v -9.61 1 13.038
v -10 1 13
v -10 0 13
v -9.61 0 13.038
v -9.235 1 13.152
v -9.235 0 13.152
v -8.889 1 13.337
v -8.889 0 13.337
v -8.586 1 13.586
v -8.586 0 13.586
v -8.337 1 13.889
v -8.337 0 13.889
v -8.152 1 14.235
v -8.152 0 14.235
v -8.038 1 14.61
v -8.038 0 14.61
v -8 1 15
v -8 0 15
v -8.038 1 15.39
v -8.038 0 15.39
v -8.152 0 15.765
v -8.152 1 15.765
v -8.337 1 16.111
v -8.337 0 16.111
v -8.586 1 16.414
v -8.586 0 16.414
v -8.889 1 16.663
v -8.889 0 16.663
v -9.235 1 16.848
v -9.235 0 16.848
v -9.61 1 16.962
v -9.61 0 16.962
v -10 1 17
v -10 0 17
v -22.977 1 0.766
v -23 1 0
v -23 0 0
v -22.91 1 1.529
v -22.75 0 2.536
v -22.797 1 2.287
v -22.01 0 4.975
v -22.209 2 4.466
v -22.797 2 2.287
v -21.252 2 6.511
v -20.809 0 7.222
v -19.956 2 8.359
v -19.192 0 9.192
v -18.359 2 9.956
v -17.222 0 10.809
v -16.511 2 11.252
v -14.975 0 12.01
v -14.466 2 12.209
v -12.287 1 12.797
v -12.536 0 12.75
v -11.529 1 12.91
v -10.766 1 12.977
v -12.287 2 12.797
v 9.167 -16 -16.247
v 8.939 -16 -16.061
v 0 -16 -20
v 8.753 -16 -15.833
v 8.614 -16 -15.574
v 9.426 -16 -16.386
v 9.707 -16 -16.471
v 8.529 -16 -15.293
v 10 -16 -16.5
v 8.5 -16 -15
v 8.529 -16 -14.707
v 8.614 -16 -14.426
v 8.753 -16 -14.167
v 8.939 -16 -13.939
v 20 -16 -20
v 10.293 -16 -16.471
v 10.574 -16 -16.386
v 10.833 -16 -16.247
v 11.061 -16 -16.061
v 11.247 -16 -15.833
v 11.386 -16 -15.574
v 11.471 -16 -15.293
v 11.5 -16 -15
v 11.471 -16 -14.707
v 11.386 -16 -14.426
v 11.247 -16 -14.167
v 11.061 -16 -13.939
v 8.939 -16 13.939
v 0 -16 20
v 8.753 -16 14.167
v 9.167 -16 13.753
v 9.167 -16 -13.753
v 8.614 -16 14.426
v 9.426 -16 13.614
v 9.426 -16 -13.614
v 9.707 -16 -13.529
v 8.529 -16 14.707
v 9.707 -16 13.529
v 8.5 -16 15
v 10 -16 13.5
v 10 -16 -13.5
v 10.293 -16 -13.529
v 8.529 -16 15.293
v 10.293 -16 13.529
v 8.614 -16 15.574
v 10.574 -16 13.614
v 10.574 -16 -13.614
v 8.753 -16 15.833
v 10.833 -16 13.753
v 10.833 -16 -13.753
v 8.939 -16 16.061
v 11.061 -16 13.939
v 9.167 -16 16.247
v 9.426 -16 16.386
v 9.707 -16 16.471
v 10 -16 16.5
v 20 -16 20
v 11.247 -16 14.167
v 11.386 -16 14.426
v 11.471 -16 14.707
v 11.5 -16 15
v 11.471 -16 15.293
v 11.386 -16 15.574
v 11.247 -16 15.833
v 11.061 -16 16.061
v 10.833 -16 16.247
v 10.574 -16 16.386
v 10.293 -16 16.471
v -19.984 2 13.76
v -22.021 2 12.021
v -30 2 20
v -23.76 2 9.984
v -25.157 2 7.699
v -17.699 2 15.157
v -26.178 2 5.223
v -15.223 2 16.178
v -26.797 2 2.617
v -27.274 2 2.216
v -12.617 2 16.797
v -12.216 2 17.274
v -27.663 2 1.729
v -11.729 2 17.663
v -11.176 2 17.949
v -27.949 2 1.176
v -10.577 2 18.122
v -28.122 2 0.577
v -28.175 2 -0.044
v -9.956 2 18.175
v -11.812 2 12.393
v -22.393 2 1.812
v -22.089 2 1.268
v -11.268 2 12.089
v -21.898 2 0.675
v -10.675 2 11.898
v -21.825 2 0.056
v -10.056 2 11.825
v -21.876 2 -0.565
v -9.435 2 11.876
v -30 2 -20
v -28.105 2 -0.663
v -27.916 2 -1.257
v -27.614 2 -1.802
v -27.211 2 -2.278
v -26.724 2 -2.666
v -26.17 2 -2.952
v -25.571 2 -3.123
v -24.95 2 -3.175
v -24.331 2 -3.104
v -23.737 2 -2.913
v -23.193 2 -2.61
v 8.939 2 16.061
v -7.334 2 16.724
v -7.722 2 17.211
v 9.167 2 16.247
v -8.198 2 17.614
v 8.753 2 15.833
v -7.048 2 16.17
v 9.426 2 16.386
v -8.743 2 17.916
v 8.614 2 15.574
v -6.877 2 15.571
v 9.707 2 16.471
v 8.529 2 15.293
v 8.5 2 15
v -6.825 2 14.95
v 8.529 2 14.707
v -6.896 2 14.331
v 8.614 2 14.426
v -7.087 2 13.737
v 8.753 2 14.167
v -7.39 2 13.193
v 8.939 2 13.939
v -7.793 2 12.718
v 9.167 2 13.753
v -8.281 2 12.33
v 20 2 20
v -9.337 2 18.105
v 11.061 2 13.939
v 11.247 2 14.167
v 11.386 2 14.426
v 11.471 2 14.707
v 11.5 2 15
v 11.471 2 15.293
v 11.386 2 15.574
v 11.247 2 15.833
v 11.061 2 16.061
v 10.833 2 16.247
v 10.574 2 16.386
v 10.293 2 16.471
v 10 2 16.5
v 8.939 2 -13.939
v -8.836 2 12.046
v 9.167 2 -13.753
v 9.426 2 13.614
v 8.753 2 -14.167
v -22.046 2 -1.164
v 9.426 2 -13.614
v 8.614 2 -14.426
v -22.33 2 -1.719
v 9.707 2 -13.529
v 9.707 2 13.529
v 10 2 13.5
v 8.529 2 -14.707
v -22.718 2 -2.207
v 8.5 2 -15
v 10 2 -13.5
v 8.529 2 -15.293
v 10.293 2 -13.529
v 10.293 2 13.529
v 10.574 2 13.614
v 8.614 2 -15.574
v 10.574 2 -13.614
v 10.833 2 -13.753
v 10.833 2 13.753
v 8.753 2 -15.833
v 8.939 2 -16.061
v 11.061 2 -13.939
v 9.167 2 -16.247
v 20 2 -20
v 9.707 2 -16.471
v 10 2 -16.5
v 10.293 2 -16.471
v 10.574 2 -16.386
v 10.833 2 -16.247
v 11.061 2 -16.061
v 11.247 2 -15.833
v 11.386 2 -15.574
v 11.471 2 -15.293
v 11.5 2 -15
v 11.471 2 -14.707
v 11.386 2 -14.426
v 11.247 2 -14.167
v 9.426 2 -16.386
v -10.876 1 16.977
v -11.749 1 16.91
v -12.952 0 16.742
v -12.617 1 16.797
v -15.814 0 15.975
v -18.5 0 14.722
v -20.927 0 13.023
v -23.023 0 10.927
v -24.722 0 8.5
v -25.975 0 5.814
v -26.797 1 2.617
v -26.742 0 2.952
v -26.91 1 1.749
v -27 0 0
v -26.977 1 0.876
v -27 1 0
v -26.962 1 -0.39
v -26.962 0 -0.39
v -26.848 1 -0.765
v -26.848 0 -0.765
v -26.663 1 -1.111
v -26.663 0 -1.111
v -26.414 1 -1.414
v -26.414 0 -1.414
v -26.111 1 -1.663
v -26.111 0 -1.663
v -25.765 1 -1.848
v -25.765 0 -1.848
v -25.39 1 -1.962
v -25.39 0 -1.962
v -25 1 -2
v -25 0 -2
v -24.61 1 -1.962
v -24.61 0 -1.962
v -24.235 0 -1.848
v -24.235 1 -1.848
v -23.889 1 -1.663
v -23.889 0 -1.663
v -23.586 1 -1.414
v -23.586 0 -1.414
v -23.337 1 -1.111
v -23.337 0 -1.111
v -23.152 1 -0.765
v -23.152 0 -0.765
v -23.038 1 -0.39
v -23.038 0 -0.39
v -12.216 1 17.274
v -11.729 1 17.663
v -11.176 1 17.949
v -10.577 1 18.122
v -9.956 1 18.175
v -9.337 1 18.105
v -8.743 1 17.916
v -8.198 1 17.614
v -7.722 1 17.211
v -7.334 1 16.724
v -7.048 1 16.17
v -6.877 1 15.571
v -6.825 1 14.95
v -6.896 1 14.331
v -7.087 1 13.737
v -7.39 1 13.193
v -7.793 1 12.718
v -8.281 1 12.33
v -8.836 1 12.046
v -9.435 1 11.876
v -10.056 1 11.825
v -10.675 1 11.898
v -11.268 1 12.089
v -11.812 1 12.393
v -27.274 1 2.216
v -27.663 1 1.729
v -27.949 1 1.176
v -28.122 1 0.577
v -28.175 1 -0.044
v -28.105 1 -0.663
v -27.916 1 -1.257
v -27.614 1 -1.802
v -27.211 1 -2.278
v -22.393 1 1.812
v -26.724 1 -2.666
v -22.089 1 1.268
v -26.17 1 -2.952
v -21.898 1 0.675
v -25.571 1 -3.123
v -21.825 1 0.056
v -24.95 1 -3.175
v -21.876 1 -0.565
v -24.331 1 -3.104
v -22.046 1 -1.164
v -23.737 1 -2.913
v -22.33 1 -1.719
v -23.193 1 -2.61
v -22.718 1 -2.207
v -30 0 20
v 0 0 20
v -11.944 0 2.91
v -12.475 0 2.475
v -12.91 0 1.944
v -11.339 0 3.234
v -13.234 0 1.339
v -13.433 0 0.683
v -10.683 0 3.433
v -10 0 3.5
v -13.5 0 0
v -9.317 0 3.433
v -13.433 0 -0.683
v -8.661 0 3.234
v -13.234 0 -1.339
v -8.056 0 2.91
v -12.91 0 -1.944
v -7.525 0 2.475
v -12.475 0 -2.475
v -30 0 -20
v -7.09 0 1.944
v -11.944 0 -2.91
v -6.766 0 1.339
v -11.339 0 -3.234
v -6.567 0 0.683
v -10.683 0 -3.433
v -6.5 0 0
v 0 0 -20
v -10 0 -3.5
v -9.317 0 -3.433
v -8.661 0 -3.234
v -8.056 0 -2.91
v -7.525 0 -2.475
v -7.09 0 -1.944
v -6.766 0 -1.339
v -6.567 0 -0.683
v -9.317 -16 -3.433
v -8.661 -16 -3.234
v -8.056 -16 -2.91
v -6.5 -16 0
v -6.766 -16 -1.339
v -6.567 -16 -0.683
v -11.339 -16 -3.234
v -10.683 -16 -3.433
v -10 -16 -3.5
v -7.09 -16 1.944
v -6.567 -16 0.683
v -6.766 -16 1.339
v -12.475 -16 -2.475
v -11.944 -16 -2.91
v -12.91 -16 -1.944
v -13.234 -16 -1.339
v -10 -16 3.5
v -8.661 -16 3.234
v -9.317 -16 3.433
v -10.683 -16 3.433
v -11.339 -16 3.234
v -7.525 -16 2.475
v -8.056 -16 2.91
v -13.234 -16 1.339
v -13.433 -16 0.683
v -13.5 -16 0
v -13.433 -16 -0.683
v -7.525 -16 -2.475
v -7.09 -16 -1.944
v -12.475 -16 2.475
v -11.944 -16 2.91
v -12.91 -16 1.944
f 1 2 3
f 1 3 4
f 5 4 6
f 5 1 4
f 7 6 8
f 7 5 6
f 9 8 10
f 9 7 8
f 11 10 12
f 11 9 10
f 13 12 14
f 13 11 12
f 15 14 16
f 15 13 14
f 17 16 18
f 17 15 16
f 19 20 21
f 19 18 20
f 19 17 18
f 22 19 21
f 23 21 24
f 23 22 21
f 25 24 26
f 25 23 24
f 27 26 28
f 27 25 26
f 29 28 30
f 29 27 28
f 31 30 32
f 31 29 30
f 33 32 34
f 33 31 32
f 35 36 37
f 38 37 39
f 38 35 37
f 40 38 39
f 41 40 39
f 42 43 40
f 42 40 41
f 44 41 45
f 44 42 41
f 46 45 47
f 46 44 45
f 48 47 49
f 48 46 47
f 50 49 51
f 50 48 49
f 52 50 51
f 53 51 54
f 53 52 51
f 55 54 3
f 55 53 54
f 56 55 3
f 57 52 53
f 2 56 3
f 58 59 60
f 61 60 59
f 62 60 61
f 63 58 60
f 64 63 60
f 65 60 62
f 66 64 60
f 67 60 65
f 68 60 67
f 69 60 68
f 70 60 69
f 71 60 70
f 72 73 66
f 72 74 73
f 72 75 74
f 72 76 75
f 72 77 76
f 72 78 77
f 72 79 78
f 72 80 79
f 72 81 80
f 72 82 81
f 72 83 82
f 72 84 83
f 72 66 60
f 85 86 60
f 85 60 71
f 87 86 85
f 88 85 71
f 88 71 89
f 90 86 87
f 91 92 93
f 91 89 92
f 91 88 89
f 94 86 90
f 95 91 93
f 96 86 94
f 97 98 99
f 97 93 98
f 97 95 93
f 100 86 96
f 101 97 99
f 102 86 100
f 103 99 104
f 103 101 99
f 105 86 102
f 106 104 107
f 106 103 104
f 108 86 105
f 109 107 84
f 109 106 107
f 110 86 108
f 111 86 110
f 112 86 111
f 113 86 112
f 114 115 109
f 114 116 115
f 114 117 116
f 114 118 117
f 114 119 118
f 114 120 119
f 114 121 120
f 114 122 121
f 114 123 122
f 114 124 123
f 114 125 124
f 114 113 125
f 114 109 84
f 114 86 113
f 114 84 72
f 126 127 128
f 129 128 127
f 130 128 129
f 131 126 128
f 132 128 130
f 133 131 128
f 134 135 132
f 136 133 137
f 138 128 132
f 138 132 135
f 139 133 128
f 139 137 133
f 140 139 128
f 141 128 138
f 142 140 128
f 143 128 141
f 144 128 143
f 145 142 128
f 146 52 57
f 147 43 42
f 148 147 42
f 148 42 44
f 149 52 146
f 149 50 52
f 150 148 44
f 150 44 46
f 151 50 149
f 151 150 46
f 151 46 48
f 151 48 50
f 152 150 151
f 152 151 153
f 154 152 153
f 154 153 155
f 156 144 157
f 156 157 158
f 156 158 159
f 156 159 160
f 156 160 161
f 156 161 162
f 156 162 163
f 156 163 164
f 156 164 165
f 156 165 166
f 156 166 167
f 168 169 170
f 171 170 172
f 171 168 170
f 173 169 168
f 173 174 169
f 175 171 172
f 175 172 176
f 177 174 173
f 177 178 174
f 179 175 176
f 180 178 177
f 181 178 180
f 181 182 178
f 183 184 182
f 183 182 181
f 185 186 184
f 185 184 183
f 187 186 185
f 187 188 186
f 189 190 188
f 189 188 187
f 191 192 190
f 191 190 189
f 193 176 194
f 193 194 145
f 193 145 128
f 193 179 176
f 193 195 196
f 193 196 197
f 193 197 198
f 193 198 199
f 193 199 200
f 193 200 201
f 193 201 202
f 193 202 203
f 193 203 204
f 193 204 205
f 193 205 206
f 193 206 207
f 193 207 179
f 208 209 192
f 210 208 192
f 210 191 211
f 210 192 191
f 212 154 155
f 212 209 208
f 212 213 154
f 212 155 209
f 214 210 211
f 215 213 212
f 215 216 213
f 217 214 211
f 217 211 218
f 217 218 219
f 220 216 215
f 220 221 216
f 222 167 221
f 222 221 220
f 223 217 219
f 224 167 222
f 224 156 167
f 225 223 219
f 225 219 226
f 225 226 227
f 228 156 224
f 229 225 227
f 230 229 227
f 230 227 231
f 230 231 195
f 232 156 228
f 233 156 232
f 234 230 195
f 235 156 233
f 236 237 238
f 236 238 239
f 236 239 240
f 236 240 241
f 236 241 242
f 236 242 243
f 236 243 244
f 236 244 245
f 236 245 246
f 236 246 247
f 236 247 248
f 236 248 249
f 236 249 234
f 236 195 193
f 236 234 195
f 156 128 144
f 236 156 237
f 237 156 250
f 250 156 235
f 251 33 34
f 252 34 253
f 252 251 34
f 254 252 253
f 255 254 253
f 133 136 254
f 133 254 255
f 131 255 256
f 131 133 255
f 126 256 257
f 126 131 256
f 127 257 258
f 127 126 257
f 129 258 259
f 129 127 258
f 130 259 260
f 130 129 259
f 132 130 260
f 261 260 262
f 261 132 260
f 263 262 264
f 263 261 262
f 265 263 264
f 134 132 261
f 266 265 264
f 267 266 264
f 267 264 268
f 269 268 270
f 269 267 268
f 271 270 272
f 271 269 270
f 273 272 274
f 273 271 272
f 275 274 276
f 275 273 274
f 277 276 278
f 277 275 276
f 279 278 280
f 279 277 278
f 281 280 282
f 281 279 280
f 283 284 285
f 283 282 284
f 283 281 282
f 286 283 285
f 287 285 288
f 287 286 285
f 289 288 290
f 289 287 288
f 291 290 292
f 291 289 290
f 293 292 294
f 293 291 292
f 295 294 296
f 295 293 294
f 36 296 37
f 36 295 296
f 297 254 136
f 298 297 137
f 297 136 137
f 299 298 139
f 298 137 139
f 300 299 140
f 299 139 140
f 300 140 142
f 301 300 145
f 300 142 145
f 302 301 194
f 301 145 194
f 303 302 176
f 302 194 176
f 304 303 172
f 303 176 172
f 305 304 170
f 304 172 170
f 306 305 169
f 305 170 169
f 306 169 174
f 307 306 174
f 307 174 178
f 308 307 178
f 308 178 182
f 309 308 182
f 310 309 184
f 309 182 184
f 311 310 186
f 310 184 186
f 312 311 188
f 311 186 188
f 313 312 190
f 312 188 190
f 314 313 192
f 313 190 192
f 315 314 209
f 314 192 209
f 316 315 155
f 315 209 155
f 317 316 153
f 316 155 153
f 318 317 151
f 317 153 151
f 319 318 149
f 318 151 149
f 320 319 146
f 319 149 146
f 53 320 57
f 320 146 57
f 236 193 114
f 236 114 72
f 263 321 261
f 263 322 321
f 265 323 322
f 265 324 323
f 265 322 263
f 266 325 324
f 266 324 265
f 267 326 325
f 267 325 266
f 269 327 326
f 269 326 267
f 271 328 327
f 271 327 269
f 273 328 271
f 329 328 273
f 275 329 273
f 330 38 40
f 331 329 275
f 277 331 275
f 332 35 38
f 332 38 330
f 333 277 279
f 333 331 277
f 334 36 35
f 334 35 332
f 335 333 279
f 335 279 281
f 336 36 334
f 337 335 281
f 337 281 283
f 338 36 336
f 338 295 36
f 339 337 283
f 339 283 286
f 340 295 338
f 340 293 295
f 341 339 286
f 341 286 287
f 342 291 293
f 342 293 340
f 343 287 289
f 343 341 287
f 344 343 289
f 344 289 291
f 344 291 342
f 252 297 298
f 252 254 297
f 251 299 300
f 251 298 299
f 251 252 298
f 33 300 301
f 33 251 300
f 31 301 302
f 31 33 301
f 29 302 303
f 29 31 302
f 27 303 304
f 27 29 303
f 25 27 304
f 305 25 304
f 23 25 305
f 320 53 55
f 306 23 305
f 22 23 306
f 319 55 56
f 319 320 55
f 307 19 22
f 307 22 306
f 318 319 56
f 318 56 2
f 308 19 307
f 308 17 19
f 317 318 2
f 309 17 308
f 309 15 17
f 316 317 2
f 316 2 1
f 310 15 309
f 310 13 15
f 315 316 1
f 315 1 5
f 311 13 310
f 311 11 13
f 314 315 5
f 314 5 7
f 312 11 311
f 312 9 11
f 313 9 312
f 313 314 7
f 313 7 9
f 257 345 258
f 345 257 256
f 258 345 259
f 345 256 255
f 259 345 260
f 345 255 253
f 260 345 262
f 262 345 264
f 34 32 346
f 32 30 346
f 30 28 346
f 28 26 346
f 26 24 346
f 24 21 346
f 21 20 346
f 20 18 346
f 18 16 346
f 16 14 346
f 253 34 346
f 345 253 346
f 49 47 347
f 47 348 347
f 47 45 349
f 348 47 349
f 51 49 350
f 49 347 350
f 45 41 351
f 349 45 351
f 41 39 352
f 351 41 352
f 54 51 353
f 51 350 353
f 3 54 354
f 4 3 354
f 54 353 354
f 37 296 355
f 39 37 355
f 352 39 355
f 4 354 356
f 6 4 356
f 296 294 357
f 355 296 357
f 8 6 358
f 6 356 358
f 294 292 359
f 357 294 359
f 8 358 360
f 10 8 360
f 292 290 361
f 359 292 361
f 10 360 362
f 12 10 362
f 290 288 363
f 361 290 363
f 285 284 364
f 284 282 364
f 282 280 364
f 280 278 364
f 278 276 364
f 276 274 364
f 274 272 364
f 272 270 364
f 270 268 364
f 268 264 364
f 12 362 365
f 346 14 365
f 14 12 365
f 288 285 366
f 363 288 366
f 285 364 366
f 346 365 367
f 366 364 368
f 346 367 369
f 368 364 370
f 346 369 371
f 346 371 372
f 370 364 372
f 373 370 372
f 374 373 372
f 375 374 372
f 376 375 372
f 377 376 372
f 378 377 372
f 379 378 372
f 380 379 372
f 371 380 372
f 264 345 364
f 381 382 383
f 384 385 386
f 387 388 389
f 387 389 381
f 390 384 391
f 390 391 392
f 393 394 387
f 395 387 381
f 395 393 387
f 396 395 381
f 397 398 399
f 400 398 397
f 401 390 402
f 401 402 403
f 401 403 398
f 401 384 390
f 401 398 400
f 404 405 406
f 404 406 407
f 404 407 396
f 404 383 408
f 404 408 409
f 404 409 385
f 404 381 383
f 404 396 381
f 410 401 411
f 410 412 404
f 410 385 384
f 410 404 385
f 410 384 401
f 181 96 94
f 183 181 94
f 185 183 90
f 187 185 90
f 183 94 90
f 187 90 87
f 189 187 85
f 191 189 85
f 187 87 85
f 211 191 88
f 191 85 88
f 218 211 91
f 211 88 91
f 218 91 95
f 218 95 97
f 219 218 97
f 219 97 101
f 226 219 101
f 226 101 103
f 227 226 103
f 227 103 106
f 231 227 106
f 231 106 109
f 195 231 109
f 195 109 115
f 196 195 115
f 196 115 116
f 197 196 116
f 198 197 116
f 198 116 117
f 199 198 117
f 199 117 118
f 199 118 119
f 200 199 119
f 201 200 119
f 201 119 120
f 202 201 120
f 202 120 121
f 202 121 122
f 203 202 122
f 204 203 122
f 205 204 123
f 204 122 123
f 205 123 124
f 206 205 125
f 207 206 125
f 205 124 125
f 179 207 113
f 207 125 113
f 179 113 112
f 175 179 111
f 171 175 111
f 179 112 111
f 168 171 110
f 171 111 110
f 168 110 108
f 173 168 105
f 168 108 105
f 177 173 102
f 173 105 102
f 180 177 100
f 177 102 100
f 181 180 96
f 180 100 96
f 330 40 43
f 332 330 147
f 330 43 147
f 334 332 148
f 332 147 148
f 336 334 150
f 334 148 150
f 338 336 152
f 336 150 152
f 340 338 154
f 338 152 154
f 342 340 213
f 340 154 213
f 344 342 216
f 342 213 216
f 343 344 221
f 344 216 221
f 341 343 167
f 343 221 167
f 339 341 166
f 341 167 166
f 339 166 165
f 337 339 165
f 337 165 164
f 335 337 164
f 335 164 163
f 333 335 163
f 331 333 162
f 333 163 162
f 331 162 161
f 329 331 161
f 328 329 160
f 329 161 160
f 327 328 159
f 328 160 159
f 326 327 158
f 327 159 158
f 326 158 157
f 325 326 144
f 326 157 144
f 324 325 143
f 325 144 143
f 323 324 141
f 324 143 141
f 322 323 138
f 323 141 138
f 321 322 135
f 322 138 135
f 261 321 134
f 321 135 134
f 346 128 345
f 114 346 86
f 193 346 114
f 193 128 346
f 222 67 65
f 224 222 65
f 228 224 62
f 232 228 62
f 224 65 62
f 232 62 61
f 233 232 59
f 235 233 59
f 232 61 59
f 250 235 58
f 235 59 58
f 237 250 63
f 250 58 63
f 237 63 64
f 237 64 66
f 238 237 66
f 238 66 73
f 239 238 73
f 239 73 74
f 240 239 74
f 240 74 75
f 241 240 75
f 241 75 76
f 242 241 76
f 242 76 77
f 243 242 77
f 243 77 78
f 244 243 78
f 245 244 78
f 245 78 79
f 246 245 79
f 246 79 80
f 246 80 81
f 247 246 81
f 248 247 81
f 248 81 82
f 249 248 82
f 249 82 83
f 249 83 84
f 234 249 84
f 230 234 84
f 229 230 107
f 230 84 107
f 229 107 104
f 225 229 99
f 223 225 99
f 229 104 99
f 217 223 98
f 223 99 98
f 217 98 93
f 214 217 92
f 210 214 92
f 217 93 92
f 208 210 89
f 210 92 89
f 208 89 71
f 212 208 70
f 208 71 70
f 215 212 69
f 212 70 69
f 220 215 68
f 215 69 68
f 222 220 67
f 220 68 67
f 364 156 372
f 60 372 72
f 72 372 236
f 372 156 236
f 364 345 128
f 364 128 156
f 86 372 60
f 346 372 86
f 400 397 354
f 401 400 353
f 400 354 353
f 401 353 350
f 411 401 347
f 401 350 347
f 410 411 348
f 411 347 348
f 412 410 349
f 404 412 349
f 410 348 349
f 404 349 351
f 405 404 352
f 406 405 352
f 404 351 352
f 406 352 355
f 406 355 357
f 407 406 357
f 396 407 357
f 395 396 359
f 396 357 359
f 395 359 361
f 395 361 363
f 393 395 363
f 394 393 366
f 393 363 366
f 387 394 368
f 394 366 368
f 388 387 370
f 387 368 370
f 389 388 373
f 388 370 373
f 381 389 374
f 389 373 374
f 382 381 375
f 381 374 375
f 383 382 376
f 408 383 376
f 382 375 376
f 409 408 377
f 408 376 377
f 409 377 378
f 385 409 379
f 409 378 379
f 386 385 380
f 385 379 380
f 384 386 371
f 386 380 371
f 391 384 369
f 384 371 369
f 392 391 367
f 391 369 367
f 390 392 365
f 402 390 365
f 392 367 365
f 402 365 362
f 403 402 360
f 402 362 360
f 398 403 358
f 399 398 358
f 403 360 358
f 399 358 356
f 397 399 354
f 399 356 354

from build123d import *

# Parameters (mm, degrees)
SKETCH1_W             = 60
SKETCH1_H             = 40
BOSS_EXTRUDE1_DEPTH   = 2
CUT_EXTRUDE1_DEPTH    = 14
SKETCH5_R             = 3.5
BOSS_EXTRUDE3_DEPTH   = 16
SKETCH6_W             = 30
SKETCH6_H             = 40
BOSS_EXTRUDE4_DEPTH   = 16
SKETCH8_R             = 3.175
CUT_EXTRUDE2_DEPTH    = 1
SKETCH9_W             = 10
SKETCH9_H             = 40
CUT_EXTRUDE3_DEPTH    = 20
F_3_0MM_DOWEL_HOLE1_D = 3


with BuildPart() as part:
    # Sketch1 → Boss-Extrude1 (new body)
    with BuildSketch(Plane(origin=(0, 0, 0), x_dir=(1, 0, 0), z_dir=(0, 1, 0))):
        Rectangle(SKETCH1_W, SKETCH1_H)
    extrude(amount=BOSS_EXTRUDE1_DEPTH)

    # Sketch4 → Cut-Extrude1 (cut)
    with BuildSketch(Plane(origin=(0, 2, 0), x_dir=(1, 0, 0), z_dir=(0, 1, 0))):
        with BuildLine():
            ThreePointArc((-23, 0), (-19.192388155, -9.192388155), (-10, -13))
            ThreePointArc((-10, -13), (-8, -15), (-10, -17))
            ThreePointArc((-10, -17), (-22.02081528, -12.02081528), (-27, 0))
            ThreePointArc((-27, 0), (-25, 2), (-23, 0))
        make_face()
    extrude(amount=-CUT_EXTRUDE1_DEPTH, mode=Mode.SUBTRACT)

    # Sketch5 → Boss-Extrude3 (add)
    with BuildSketch(Plane.XZ):
        with Locations(Location((-10, 0, 0), (0, 0, 90))):
            Circle(SKETCH5_R)
    extrude(amount=BOSS_EXTRUDE3_DEPTH)

    # Sketch6 → Boss-Extrude4 (add)
    with BuildSketch(Plane.XZ):
        with Locations((15, 0)):
            Rectangle(SKETCH6_W, SKETCH6_H)
    extrude(amount=BOSS_EXTRUDE4_DEPTH)

    # Sketch8 → Cut-Extrude2 (cut)
    with BuildSketch(Plane(origin=(0, 2, 0), x_dir=(1, 0, 0), z_dir=(0, 1, 0))):
        with Locations((-25, 0)):
            Circle(SKETCH8_R)
        with Locations((-10, -15)):
            Circle(SKETCH8_R)
    extrude(amount=-CUT_EXTRUDE2_DEPTH, mode=Mode.SUBTRACT)

    # Sketch9 → Cut-Extrude3 (cut)
    with BuildSketch(Plane(origin=(0, 2, 0), x_dir=(1, 0, 0), z_dir=(0, 1, 0))):
        with Locations((25, 0)):
            Rectangle(SKETCH9_W, SKETCH9_H)
    extrude(amount=-CUT_EXTRUDE3_DEPTH, mode=Mode.SUBTRACT)

    # Ø3.0mm Dowel Hole1 (through all)
    with Locations(Plane(origin=(0, 2, 0), x_dir=(1, 0, 0), z_dir=(0, 1, 0))):
        with Locations((10, 15), (10, -15)):
            Hole(F_3_0MM_DOWEL_HOLE1_D / 2)


solid = part.part
